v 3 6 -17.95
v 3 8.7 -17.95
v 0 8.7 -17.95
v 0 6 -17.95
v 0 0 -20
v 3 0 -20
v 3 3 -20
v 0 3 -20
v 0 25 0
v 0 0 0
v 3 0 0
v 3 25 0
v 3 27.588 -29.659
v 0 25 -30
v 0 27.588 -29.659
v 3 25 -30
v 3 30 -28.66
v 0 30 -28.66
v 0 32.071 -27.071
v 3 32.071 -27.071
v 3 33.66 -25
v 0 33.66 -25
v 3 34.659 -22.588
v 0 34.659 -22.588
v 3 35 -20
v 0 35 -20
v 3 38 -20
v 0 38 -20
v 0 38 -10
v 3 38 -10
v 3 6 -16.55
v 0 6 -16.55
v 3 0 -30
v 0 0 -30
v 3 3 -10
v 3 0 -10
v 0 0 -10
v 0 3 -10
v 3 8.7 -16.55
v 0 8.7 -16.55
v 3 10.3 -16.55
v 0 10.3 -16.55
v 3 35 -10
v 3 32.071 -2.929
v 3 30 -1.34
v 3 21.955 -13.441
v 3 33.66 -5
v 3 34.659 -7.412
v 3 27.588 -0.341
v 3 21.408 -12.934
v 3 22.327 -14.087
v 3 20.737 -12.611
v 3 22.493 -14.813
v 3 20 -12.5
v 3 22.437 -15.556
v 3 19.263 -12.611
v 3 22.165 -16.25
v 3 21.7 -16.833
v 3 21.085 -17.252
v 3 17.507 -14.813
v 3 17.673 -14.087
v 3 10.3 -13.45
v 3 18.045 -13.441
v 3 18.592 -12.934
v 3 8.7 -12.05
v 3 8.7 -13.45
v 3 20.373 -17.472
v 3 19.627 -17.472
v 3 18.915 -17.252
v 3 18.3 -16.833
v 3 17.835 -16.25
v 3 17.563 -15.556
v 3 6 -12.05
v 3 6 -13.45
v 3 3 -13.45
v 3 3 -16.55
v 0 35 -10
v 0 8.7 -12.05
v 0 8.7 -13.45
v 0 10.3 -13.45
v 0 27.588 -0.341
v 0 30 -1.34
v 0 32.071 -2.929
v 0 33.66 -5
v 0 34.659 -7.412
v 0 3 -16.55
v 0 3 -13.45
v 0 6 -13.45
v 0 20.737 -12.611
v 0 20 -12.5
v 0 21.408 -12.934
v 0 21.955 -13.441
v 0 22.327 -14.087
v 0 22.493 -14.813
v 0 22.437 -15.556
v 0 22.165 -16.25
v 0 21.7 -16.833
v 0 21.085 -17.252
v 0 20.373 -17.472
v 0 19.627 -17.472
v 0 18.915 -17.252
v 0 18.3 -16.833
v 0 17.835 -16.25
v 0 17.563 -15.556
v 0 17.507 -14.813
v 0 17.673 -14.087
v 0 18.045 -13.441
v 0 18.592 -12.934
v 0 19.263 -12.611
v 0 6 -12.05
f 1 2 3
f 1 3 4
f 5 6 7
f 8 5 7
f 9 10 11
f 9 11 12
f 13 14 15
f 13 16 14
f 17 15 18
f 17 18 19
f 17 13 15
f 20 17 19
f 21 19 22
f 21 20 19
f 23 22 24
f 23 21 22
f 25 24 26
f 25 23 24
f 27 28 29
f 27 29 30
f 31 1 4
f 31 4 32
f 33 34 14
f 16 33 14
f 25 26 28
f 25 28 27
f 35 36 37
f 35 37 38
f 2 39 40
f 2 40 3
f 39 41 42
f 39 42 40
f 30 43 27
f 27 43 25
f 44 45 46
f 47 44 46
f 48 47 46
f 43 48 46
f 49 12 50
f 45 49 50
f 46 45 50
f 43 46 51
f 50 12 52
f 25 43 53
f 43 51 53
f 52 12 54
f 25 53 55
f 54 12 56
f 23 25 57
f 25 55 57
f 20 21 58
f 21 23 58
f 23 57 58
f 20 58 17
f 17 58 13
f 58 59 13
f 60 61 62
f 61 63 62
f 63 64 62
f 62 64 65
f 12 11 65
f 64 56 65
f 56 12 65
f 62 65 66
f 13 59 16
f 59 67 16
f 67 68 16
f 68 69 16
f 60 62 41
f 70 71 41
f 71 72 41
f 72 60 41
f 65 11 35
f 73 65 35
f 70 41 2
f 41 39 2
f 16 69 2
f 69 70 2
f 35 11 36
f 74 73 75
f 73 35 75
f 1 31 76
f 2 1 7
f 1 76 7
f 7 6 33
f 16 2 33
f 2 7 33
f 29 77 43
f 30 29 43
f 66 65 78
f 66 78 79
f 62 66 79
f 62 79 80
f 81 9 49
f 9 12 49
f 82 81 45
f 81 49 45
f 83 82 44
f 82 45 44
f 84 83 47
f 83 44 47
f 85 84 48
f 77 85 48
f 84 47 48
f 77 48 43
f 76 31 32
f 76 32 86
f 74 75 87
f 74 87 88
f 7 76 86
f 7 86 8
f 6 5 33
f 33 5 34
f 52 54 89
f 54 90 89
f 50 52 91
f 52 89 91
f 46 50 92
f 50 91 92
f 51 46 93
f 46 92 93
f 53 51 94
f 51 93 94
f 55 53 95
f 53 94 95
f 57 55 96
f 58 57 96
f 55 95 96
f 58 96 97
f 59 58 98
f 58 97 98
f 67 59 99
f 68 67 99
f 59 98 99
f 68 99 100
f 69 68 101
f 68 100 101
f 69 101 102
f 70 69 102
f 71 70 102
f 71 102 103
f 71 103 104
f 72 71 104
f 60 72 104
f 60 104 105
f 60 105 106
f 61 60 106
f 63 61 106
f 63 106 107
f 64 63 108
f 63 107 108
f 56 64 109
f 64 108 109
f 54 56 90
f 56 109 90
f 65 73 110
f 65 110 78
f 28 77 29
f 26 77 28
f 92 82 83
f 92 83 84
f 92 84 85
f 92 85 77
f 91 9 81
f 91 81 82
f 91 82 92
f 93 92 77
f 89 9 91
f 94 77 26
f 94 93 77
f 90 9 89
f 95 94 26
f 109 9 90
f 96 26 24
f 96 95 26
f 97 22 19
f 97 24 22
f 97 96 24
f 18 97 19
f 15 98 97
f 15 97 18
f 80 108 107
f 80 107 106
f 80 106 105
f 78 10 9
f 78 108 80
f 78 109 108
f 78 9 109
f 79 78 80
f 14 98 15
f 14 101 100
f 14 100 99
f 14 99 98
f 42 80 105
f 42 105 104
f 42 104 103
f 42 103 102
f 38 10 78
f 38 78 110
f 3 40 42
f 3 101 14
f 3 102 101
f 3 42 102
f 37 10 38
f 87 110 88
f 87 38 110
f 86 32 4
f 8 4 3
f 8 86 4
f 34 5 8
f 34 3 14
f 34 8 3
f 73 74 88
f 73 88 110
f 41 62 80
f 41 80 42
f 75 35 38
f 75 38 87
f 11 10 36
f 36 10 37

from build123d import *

# Parameters (mm, degrees)
SKETCH1_W                 = 30
SKETCH1_H                 = 35
BOSS_EXTRUDE1_DEPTH       = 3
FILLET1_R                 = 10
SKETCH2_W                 = 10
SKETCH2_H                 = 3
CUT_EXTRUDE1_DEPTH        = 3
F_5_0MM_DOWEL_HOLE1_D     = 5
F_5_0MM_DOWEL_HOLE1_DEPTH = 3
F_5_0MM_DOWEL_HOLE1_TIP   = 1.502151548
CUT_EXTRUDE2_DEPTH        = 3
SKETCH6_W                 = 3
SKETCH6_H                 = 10
BOSS_EXTRUDE2_DEPTH       = 3


with BuildPart() as part:
    # Sketch1 → Boss-Extrude1 (new body)
    with BuildSketch(Plane(origin=(0, 0, 0), x_dir=(0, 0, -1), z_dir=(1, 0, 0))):
        with Locations((15, 17.5)):
            Rectangle(SKETCH1_W, SKETCH1_H)
    extrude(amount=BOSS_EXTRUDE1_DEPTH)

    # Fillet1
    fillet1_edges = [part.edges().sort_by_distance(p)[0] for p in [
        (1.5, 35, 0),
        (1.5, 35, -30),
    ]]
    fillet(fillet1_edges, radius=FILLET1_R)

    # Sketch2 → Cut-Extrude1 (cut)
    with BuildSketch(Plane(origin=(3, 0, 0), x_dir=(0, 0, -1), z_dir=(1, 0, 0))):
        with Locations((15, 1.5)):
            Rectangle(SKETCH2_W, SKETCH2_H)
    extrude(amount=-CUT_EXTRUDE1_DEPTH, mode=Mode.SUBTRACT)

    # Ø5.0mm Dowel Hole1
    with Locations(Plane(origin=(3, 0, 0), x_dir=(0, 0, -1), z_dir=(1, 0, 0))):
        with Locations((15, 20)):
            Hole(F_5_0MM_DOWEL_HOLE1_D / 2, depth=F_5_0MM_DOWEL_HOLE1_DEPTH)
            with Locations((0, 0, -(F_5_0MM_DOWEL_HOLE1_DEPTH + F_5_0MM_DOWEL_HOLE1_TIP / 2))):  # 118° drill point
                Cone(0, F_5_0MM_DOWEL_HOLE1_D / 2, F_5_0MM_DOWEL_HOLE1_TIP, mode=Mode.SUBTRACT)

    # Sketch5 → Cut-Extrude2 (cut)
    with BuildSketch(Plane(origin=(3, 0, 0), x_dir=(0, 0, -1), z_dir=(1, 0, 0))):
        Polygon((13.45, 3), (13.45, 6), (12.05, 6), (12.05, 8.7), (13.45, 8.7), (13.45, 10.3), (16.55, 10.3), (16.55, 8.7), (17.95, 8.7), (17.95, 6), (16.55, 6), (16.55, 3), align=None)
    extrude(amount=-CUT_EXTRUDE2_DEPTH, mode=Mode.SUBTRACT)

    # Sketch6 → Boss-Extrude2 (add)
    with BuildSketch(Plane(origin=(0, 35, 0), x_dir=(1, 0, 0), z_dir=(0, 1, 0))):
        with Locations((1.5, 15)):
            Rectangle(SKETCH6_W, SKETCH6_H)
    extrude(amount=BOSS_EXTRUDE2_DEPTH)


solid = part.part
